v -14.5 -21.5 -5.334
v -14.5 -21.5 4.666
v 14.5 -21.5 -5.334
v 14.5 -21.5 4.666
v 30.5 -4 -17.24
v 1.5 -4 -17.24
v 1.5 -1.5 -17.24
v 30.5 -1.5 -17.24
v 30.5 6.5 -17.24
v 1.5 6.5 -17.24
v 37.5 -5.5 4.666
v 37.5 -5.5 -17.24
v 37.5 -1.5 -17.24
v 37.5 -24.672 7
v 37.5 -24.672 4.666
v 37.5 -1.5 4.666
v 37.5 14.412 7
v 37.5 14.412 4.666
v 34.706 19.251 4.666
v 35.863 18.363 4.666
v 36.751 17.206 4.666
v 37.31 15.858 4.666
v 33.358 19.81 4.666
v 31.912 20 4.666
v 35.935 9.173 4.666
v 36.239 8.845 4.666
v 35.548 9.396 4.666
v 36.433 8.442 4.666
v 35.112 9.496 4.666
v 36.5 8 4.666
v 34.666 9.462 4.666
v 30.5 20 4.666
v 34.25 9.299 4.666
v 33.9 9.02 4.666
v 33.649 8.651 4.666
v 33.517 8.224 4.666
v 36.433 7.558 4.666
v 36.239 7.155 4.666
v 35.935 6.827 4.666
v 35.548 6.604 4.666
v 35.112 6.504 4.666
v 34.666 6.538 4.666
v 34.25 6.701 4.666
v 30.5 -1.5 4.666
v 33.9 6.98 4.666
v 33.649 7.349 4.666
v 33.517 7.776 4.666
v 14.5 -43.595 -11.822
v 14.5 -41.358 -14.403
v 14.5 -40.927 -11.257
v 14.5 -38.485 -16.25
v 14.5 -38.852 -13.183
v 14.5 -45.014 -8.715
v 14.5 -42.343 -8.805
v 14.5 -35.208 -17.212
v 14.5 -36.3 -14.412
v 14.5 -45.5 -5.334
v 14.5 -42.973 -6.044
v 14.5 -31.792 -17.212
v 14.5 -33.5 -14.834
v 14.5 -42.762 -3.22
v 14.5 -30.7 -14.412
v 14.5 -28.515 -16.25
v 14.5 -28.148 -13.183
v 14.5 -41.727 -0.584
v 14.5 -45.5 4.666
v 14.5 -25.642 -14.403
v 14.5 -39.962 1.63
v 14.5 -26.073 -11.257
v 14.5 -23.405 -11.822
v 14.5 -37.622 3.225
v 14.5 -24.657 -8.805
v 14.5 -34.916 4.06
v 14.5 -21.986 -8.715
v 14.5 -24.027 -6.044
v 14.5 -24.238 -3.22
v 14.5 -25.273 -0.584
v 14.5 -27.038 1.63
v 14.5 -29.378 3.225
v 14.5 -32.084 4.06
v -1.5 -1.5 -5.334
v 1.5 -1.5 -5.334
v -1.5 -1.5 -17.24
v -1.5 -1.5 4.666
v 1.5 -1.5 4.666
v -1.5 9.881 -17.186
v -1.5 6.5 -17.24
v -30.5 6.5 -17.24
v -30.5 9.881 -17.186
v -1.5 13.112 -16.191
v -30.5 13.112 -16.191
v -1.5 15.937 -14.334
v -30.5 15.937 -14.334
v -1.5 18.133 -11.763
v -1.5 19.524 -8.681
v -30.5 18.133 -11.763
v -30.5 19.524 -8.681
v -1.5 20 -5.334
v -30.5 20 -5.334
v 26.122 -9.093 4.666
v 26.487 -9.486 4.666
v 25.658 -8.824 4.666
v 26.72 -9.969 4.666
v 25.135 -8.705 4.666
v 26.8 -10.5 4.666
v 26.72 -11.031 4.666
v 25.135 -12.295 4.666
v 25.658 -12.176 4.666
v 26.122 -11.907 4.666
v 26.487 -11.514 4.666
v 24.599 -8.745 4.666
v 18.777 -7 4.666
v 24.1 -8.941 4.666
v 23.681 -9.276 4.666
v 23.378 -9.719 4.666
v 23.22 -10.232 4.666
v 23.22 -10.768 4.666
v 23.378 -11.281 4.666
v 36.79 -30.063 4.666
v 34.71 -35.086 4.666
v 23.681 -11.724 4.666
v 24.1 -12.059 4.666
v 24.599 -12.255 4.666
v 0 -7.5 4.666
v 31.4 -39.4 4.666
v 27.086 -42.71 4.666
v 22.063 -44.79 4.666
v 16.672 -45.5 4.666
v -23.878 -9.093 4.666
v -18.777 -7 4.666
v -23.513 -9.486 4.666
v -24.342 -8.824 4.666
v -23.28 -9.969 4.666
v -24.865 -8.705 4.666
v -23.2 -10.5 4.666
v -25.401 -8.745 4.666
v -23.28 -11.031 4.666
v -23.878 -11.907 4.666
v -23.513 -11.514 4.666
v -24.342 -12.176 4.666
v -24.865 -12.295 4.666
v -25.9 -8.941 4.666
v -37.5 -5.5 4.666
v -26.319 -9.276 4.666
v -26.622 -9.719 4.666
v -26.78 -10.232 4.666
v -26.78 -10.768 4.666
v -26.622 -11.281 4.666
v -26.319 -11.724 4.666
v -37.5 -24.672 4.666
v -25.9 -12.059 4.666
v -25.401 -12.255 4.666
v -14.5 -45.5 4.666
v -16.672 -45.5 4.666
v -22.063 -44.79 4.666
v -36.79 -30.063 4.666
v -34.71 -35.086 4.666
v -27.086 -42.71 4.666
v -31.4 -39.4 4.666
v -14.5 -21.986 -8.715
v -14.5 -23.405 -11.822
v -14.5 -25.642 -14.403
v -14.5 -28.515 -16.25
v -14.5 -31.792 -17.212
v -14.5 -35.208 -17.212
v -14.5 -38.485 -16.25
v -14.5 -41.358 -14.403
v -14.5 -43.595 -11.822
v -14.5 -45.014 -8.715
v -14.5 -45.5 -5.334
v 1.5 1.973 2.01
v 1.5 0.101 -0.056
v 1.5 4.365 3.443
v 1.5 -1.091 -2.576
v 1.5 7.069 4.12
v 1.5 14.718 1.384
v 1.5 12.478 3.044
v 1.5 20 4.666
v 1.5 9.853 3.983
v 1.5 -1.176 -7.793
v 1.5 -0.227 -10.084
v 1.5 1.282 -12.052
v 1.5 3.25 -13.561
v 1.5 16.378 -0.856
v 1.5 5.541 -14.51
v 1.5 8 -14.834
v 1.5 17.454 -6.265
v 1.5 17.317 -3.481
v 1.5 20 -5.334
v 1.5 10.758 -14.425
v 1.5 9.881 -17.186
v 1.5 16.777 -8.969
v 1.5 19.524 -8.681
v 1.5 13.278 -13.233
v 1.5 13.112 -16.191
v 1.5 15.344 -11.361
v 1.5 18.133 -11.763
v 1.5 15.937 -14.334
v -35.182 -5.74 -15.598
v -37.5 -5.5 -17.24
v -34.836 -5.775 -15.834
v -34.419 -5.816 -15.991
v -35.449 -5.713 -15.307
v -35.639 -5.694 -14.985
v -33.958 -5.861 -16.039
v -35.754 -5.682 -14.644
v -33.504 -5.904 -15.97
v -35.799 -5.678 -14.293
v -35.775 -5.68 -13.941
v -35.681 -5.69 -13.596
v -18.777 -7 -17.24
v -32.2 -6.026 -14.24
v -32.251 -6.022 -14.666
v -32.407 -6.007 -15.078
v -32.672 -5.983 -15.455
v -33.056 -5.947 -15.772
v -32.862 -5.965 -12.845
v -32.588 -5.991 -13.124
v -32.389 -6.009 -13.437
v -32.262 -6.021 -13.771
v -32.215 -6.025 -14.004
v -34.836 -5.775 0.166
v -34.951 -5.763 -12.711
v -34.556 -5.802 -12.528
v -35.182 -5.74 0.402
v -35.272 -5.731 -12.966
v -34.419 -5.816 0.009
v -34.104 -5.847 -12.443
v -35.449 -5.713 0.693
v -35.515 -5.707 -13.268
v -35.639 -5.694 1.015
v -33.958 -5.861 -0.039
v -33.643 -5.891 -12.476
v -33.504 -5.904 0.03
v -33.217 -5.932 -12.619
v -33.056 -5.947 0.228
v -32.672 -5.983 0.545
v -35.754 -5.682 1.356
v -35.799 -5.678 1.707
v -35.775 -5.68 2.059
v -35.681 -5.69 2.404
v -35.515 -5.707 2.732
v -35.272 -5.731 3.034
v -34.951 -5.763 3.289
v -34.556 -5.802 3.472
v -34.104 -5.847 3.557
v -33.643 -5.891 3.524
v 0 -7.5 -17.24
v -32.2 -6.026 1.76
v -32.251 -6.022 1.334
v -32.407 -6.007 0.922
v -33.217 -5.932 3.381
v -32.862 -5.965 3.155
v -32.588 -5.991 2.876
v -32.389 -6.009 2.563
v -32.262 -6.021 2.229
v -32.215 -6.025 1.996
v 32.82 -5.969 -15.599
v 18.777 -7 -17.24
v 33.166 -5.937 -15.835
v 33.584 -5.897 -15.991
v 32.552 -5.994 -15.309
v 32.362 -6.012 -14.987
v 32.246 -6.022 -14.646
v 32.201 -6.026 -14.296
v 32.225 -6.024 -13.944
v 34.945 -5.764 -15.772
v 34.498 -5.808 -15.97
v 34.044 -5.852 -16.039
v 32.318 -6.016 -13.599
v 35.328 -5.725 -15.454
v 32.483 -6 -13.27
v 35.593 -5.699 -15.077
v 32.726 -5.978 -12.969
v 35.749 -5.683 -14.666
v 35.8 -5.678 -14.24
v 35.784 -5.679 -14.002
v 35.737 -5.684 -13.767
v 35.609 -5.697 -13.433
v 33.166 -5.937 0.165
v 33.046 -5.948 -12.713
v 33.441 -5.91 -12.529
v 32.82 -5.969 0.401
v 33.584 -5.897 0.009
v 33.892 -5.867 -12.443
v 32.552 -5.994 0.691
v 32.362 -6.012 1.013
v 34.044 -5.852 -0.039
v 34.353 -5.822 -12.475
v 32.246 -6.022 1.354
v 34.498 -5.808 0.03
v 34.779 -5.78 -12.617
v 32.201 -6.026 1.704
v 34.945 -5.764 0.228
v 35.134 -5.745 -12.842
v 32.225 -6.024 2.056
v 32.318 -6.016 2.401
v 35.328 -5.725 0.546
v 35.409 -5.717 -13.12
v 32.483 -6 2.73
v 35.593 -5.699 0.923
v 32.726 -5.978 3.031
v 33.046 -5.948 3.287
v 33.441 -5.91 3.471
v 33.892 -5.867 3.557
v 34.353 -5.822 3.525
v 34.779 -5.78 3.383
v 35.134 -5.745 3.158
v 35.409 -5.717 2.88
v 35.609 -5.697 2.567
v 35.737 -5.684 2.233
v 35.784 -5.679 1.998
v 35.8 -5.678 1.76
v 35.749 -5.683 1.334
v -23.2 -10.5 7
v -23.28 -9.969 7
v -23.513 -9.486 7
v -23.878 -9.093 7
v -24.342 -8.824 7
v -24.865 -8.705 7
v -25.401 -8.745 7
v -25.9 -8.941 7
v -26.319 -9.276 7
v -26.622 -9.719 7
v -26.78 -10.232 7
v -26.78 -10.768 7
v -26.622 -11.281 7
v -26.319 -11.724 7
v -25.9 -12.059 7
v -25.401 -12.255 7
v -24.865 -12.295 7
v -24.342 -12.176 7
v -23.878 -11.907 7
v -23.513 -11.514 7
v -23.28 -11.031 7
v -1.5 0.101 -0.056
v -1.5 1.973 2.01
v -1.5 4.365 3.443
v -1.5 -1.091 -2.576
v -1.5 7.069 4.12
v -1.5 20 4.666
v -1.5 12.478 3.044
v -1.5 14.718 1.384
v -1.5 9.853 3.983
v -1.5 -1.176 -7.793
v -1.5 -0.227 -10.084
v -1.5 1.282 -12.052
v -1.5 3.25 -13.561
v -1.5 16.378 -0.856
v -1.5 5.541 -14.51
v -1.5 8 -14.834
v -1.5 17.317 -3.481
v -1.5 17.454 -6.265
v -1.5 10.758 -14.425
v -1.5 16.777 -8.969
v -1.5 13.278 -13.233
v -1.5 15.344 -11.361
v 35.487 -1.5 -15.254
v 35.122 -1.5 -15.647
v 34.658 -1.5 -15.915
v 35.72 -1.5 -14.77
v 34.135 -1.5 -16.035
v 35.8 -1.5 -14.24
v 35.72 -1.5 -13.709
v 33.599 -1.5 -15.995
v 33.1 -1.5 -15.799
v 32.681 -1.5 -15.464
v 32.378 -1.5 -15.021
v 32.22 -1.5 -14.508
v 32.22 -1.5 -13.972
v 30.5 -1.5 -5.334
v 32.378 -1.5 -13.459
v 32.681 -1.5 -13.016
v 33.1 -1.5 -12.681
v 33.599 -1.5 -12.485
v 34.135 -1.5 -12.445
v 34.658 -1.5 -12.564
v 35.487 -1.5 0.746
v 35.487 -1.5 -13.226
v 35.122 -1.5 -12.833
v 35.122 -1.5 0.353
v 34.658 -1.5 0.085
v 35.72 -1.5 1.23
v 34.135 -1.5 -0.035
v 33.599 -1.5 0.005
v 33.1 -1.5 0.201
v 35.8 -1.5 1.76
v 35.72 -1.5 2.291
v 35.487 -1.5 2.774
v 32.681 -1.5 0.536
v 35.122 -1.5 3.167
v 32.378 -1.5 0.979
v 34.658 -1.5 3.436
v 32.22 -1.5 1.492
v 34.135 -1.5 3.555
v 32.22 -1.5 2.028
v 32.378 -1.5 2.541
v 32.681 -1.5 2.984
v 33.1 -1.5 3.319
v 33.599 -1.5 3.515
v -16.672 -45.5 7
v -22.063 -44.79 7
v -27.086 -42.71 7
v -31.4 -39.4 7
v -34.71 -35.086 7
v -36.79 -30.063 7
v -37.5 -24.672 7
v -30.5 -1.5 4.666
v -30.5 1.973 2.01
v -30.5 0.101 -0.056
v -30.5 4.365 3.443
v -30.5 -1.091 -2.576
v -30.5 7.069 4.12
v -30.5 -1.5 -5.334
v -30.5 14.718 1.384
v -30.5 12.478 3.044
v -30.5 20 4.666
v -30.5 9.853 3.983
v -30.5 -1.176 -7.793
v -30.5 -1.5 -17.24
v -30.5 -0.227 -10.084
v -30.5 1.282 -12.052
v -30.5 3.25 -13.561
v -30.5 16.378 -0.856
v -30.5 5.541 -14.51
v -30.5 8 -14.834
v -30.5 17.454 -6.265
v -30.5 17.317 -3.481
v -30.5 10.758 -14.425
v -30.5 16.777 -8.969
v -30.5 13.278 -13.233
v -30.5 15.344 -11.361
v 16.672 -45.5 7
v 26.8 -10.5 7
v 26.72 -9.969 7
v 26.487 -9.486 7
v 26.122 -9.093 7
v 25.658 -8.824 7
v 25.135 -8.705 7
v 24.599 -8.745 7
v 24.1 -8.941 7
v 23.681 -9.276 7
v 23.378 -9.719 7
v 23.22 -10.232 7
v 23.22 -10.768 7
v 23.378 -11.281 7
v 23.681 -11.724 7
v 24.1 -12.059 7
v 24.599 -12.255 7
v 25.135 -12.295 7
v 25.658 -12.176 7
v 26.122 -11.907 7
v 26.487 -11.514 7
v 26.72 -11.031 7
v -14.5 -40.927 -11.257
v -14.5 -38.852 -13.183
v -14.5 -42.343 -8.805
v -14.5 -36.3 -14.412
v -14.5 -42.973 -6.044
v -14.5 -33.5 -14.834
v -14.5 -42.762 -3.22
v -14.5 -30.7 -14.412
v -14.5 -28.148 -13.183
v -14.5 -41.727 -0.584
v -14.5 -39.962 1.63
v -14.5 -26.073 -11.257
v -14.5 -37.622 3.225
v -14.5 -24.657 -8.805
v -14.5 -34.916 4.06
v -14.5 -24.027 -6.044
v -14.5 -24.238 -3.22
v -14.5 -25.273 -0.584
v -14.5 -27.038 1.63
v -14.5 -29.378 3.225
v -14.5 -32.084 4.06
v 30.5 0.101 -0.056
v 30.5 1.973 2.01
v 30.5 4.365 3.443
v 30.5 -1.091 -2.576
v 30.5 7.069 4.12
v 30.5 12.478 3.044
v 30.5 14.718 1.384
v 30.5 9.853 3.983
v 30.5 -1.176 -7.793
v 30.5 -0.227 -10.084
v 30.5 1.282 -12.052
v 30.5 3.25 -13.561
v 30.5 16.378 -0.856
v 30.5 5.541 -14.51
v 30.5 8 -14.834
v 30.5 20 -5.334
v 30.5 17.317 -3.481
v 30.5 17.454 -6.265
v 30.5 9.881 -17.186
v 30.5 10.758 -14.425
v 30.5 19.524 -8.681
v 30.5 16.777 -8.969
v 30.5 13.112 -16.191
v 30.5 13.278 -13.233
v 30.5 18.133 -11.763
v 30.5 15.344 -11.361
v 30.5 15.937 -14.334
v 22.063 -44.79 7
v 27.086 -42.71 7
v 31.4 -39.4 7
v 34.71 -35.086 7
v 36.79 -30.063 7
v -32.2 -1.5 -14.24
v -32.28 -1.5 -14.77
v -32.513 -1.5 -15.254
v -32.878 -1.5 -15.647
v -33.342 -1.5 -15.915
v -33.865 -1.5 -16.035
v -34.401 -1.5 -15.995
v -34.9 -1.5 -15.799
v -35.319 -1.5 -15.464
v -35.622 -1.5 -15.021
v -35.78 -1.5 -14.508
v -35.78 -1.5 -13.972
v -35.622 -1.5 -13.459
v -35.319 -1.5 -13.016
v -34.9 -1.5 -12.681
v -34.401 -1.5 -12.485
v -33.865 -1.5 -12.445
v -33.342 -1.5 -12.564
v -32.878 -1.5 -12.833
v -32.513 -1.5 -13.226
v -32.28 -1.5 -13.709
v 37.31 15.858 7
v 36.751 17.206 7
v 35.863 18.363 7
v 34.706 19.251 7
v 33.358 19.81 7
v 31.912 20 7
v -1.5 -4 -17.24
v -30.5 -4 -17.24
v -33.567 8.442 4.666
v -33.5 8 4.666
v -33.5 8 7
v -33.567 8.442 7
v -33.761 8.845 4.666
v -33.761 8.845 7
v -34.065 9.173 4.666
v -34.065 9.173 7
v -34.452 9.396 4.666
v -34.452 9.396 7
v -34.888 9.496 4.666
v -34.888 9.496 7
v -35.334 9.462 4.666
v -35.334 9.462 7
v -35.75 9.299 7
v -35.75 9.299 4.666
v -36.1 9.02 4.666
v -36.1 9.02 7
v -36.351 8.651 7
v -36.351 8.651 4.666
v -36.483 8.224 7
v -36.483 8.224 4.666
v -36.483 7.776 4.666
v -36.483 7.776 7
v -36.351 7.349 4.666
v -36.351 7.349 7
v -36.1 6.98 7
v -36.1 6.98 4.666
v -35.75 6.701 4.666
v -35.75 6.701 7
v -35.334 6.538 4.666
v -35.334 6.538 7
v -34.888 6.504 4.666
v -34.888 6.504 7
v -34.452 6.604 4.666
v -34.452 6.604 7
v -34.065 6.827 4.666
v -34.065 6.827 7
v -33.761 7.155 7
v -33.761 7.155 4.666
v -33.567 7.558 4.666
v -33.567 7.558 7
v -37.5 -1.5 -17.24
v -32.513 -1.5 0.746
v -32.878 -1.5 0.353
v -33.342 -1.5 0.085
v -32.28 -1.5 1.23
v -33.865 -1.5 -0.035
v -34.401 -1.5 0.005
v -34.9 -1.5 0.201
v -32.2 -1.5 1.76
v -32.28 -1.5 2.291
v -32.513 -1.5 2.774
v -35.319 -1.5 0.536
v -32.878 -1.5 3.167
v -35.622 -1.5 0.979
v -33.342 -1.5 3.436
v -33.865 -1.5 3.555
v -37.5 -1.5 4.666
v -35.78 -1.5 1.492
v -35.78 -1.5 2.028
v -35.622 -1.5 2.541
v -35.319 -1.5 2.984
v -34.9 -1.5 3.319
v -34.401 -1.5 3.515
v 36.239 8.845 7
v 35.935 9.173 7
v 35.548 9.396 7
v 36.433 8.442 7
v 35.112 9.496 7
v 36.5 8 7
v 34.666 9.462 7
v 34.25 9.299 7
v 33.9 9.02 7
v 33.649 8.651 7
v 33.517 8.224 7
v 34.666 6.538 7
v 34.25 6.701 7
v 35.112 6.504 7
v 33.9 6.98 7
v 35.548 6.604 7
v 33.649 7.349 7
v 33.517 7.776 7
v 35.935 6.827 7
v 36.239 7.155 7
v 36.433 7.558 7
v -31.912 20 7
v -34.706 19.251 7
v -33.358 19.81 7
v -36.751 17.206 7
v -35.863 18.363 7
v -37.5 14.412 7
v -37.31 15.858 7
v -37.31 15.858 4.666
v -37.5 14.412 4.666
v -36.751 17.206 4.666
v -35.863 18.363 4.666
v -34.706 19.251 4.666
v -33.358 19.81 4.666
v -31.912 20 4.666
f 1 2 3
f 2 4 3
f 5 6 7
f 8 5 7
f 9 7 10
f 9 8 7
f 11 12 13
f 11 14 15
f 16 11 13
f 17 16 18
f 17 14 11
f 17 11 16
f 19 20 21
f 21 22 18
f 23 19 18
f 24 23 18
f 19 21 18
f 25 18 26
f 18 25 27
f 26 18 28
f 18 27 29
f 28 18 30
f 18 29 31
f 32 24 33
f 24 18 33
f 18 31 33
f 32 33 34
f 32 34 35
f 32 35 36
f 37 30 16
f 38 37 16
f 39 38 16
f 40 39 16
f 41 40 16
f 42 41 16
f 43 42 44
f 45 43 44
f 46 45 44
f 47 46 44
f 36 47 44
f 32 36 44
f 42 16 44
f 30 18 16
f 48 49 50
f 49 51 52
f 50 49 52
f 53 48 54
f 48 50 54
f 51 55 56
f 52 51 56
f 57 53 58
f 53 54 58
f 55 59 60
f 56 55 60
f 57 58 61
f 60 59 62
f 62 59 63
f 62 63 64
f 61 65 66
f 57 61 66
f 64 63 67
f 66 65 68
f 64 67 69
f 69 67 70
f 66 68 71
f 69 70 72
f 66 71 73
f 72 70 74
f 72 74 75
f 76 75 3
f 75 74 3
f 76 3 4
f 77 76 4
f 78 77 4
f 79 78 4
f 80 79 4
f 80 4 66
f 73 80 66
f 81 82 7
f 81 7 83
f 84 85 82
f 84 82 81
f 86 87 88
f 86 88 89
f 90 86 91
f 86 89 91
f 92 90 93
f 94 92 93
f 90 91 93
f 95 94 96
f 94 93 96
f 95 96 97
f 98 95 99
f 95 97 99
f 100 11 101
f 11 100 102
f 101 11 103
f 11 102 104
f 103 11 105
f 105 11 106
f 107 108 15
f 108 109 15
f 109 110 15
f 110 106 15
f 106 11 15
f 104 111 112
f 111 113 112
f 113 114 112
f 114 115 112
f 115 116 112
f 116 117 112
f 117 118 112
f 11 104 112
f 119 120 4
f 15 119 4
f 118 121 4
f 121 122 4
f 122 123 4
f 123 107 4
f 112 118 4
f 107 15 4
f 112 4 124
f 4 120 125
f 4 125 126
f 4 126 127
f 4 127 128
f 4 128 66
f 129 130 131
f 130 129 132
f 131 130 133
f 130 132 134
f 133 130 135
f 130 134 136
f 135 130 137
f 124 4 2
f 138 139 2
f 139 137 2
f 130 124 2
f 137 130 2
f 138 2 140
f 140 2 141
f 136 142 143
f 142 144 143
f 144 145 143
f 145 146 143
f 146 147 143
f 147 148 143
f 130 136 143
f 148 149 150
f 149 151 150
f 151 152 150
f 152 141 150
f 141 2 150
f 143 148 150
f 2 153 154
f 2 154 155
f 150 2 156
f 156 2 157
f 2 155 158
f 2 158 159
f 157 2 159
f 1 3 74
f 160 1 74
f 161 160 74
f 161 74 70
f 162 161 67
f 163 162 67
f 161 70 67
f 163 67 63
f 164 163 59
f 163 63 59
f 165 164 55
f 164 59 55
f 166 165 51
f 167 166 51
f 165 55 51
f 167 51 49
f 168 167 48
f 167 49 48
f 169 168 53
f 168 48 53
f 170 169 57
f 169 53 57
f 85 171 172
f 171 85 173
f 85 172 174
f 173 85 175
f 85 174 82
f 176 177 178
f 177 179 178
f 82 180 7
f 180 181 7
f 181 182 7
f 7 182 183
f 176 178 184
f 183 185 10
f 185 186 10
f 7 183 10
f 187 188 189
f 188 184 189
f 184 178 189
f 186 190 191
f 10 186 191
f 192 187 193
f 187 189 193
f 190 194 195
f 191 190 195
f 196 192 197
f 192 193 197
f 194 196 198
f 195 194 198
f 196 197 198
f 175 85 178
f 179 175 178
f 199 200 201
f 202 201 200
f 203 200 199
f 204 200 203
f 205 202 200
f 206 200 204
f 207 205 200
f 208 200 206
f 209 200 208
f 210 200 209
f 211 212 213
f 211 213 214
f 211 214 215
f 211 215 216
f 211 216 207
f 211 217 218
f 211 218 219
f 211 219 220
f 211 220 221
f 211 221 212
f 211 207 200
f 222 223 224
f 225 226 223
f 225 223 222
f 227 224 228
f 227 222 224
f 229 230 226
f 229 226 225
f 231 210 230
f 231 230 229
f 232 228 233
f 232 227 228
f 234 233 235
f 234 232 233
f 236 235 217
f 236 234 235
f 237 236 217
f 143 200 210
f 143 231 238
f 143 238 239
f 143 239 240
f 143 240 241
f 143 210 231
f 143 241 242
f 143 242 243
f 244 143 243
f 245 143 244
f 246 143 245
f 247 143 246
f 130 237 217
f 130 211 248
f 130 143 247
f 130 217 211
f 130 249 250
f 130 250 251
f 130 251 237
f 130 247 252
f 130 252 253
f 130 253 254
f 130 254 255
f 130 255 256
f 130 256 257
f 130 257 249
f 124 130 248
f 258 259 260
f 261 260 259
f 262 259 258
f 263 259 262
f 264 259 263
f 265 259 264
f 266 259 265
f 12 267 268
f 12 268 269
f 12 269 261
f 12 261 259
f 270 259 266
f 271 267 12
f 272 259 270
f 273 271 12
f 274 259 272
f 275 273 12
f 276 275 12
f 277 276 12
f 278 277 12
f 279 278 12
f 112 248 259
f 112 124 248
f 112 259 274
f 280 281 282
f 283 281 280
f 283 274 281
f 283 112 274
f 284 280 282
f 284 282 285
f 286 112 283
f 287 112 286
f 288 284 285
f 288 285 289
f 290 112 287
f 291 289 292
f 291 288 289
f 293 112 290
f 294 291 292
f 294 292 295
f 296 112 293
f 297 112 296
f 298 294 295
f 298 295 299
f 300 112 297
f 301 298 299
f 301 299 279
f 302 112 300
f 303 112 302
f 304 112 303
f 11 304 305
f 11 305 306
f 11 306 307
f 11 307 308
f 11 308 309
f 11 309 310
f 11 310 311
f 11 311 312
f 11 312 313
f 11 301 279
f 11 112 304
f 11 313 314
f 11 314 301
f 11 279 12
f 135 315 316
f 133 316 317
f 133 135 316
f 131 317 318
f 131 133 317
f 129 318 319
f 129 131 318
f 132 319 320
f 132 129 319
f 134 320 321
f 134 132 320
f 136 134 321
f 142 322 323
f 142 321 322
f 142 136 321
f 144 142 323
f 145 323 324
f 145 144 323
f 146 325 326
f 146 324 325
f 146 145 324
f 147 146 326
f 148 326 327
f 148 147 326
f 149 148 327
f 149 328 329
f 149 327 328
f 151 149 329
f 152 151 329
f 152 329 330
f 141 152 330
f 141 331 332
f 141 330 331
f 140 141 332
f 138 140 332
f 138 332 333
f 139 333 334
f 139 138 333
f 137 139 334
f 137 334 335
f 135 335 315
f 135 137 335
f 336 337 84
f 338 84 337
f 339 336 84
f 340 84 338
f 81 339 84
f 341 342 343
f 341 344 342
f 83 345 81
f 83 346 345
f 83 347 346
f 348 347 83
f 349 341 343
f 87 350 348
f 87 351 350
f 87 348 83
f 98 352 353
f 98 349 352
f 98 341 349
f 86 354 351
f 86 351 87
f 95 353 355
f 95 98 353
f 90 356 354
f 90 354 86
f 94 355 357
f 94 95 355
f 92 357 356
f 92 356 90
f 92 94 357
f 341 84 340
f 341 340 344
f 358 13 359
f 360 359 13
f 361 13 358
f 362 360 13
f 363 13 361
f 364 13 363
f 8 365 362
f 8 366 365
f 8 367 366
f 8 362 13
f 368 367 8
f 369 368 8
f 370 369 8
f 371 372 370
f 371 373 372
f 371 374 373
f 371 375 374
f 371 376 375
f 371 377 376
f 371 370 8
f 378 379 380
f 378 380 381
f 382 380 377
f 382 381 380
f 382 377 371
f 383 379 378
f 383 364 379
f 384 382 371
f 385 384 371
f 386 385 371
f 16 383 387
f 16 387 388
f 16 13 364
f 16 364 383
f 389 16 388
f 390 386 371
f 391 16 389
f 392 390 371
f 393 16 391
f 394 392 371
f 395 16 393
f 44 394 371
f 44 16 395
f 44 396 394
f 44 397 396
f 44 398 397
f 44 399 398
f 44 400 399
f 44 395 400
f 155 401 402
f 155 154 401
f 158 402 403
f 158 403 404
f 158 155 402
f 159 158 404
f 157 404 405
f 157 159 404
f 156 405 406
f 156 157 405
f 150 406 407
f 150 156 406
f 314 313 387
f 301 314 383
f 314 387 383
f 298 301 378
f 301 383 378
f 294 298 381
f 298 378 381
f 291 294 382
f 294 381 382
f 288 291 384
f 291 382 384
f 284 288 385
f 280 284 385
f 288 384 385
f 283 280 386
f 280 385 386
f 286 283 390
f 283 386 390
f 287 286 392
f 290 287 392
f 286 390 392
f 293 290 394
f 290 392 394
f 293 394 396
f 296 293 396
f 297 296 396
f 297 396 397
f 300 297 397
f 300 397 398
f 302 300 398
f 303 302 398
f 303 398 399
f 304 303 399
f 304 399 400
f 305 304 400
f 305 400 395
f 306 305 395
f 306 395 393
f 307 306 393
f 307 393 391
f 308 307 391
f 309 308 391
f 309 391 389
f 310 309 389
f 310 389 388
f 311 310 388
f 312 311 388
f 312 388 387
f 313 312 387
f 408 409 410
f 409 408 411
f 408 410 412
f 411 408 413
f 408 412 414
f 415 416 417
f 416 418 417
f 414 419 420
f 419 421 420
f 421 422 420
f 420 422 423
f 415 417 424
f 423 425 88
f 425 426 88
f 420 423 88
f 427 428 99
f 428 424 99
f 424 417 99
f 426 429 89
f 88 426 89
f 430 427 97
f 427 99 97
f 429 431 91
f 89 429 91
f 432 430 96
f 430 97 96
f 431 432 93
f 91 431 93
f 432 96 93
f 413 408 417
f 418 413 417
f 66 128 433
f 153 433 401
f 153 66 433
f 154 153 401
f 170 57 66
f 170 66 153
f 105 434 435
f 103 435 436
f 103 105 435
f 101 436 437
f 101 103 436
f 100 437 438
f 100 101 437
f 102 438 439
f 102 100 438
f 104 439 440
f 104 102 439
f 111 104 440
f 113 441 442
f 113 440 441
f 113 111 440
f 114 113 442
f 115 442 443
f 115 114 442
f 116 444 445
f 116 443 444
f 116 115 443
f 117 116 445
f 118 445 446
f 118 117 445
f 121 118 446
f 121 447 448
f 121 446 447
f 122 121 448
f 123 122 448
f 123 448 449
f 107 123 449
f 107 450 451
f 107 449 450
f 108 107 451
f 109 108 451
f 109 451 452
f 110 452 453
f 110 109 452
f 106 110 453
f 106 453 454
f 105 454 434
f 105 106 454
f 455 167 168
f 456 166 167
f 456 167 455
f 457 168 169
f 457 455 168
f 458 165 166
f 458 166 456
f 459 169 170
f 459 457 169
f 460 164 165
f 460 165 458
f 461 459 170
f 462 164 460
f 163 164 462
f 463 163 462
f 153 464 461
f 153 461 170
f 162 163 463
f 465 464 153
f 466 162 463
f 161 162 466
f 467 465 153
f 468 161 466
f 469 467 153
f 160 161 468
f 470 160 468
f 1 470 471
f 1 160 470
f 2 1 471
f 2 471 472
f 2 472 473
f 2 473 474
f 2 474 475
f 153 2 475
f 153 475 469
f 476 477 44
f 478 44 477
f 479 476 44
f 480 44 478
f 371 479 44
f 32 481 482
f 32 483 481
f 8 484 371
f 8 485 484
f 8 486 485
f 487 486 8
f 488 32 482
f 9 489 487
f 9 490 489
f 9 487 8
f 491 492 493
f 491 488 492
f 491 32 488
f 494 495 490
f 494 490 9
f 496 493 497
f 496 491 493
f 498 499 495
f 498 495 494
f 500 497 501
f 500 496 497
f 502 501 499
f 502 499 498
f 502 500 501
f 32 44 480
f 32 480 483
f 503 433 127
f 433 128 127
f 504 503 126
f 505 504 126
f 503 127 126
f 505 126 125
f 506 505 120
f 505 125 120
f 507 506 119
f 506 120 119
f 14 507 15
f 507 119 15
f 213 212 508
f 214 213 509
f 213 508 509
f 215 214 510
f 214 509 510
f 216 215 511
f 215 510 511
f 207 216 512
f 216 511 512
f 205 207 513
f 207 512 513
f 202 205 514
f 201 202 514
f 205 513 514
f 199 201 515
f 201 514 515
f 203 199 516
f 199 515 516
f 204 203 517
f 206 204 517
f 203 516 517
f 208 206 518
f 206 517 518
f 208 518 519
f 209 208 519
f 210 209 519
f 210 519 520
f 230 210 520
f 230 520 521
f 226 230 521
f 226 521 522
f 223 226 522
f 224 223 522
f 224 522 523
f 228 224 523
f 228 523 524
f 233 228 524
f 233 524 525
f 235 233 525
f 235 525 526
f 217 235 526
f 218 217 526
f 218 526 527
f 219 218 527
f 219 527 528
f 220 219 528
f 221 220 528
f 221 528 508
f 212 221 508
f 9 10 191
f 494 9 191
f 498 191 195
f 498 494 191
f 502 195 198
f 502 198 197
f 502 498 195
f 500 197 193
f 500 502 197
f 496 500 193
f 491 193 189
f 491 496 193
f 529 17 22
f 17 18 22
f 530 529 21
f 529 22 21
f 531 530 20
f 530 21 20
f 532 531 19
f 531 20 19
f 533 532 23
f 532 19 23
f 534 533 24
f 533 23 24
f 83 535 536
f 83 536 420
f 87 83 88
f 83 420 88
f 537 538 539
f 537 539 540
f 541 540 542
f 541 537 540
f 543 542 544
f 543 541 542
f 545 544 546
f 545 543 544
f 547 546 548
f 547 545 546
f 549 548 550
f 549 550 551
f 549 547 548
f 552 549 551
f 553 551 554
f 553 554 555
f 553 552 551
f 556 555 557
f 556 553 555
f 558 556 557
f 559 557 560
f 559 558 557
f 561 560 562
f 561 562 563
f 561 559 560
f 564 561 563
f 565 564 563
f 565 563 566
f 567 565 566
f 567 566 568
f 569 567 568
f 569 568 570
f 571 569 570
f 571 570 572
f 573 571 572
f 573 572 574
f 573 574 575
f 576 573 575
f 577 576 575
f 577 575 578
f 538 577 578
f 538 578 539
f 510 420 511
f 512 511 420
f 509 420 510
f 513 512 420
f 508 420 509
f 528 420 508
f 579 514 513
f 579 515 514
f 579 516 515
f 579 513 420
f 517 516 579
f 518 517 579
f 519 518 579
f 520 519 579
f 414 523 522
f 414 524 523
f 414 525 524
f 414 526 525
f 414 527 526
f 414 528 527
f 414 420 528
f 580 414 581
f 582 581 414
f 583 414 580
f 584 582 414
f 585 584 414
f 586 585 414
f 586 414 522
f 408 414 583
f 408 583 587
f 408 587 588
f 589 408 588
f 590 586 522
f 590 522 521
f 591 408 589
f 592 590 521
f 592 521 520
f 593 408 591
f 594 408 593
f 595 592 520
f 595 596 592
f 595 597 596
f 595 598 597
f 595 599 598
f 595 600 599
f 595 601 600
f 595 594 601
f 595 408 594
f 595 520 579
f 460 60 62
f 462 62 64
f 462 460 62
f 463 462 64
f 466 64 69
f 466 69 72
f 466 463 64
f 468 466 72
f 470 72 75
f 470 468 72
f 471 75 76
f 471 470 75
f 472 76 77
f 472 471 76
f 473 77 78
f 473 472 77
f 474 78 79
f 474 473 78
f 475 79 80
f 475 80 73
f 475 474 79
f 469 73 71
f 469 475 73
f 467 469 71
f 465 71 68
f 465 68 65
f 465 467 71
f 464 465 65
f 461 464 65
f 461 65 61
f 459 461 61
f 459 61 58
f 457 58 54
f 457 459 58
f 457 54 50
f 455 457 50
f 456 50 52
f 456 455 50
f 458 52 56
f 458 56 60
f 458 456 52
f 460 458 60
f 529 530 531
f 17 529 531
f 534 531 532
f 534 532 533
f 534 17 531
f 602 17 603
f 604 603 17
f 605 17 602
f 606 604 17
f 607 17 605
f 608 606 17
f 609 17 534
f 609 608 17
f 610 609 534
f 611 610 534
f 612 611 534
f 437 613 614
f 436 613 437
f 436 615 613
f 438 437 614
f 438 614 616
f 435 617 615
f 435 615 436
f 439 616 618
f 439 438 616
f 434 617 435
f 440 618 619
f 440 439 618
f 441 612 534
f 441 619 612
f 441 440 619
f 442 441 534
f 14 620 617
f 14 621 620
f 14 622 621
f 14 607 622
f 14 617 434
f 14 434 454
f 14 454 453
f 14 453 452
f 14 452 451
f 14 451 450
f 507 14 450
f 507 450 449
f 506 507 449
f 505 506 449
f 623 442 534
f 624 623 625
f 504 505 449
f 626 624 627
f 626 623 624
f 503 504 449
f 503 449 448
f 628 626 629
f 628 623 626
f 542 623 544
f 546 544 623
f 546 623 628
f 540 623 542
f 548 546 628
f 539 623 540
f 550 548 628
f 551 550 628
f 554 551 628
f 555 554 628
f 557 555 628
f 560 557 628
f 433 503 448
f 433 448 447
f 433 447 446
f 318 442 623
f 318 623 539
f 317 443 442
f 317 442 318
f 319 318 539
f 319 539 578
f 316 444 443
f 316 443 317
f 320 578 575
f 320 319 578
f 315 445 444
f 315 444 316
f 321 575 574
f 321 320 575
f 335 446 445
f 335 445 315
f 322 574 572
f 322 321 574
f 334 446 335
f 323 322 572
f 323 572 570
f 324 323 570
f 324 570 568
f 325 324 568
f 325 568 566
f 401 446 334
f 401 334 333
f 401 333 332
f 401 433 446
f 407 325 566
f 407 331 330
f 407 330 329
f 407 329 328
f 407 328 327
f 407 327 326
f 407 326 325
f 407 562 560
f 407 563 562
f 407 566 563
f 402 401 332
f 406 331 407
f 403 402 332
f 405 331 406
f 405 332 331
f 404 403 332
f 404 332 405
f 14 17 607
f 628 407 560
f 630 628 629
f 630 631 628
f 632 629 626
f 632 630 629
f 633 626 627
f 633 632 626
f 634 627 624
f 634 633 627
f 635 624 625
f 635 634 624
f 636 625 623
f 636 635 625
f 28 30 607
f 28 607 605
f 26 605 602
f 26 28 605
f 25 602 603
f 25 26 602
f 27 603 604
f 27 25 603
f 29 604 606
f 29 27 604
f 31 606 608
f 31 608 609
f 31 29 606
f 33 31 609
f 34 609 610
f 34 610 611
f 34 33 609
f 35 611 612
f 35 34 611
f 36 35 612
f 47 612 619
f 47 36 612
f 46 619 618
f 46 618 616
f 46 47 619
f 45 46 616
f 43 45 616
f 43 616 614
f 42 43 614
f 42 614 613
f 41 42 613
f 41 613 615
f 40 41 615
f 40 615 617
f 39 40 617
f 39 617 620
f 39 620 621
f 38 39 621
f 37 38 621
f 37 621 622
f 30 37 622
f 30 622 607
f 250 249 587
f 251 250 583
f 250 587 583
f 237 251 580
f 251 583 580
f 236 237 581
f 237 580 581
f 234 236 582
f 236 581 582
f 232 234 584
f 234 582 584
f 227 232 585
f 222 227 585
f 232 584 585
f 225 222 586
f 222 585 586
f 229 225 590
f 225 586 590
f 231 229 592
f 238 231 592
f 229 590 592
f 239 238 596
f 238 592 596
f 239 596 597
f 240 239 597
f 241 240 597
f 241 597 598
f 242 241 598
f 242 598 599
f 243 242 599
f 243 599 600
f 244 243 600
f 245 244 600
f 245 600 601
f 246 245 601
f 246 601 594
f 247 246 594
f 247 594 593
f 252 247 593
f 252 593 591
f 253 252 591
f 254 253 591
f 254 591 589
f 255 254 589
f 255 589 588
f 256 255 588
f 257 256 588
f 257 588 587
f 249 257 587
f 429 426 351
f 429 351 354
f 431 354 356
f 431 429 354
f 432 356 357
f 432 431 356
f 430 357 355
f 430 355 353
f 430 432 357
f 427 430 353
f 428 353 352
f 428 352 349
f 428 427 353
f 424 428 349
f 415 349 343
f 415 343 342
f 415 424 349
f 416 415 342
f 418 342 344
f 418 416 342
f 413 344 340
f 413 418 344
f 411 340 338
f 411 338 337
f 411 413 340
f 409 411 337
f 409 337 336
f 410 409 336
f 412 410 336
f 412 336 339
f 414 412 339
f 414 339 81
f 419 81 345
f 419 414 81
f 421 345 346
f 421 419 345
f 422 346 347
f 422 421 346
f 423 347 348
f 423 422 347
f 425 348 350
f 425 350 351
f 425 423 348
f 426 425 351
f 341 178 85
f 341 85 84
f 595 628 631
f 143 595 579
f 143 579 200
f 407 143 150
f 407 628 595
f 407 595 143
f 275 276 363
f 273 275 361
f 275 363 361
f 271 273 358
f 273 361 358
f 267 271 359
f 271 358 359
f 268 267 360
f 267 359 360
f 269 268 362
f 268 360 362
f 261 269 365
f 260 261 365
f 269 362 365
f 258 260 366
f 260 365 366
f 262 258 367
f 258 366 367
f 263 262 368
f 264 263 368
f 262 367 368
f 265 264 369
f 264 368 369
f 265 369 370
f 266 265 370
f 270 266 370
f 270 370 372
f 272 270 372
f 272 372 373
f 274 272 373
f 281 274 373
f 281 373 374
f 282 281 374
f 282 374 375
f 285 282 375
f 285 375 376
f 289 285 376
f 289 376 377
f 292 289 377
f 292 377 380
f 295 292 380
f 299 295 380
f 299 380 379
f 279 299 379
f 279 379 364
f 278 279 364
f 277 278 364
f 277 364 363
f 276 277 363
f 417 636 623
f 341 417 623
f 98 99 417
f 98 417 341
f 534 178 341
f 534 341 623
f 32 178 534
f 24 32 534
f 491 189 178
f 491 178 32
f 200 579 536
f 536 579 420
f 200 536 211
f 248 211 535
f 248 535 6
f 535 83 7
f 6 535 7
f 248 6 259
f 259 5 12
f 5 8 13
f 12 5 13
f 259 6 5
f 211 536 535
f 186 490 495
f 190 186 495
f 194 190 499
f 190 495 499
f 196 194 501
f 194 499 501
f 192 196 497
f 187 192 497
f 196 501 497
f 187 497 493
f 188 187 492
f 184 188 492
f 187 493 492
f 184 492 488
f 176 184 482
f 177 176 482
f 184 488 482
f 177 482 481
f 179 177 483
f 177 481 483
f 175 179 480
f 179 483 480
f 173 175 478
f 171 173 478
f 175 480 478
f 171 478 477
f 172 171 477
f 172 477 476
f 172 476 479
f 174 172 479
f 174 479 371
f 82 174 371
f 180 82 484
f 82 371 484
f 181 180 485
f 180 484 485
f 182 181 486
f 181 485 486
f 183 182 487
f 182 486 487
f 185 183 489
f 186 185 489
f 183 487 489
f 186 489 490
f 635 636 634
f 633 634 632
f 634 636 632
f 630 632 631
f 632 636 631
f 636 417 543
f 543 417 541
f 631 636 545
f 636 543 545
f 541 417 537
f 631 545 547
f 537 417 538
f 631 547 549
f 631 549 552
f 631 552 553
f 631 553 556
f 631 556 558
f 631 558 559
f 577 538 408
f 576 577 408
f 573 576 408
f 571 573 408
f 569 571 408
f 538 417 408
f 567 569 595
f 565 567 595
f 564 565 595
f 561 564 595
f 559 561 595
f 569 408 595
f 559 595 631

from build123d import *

# Parameters (mm, degrees)
SKETCH1_R            = 1.79994
SKETCH1_R_2          = 1.5
BOSS_EXTRUDE1_DEPTH  = 7
SKETCH2_W            = 75
SKETCH2_H            = 13.099999962
SKETCH2_R            = 2.6999438
SKETCH2_R_2          = 2.499995
SKETCH2_R_3          = 1.3498449
BOSS_EXTRUDE2_DEPTH  = 6.987999994
SKETCH2_3_R          = 2.6999438
SKETCH2_3_R_2        = 1.3498449
CUT_EXTRUDE1_DEPTH   = 2.5
SKETCH5_W            = 75
SKETCH5_H            = 13.099999962
CUT_EXTRUDE3_DEPTH   = 21.082
SKETCH6_W            = 75
SKETCH6_H            = 7
BOSS_EXTRUDE3_DEPTH  = 9.5
SKETCH8_W            = 75
SKETCH8_H            = 38.030205227
CUT_EXTRUDE4_DEPTH   = 4.666
SKETCH10_W           = 75
SKETCH10_H           = 2.334
BOSS_EXTRUDE5_DEPTH  = 35
SKETCH11_R           = 1.79994
CUT_EXTRUDE5_DEPTH   = 5
SKETCH15_W           = 44.653530321
SKETCH15_H           = 13.617301916
SKETCH15_W_2         = 11.728266088
SKETCH15_H_2         = 5.987537529
BOSS_EXTRUDE7_DEPTH  = 2.334
SKETCH16_R           = 9.5
BOSS_EXTRUDE9_DEPTH  = 29
SKETCH17_R           = 9.5
BOSS_EXTRUDE11_DEPTH = 14.5
FILLET5_R            = 20.828
FILLET6_R            = 5.588
BOSS_EXTRUDE13_DEPTH = 21.905881
CUT_EXTRUDE6_REACH   = 46
SKETCH21_R           = 1.8


with BuildPart() as part:
    # Sketch1 → Boss-Extrude1 (new body)
    with BuildSketch(Plane.XY):
        with BuildLine():
            Line((37.5, -10.5), (30, -10.5))
            ThreePointArc((30, -10.5), (25, -15.5), (20, -10.5))
            Line((20, -10.5), (5, -10.5))
            ThreePointArc((5, -10.5), (0, -15.5), (-5, -10.5))
            Line((-5, -10.5), (-20, -10.5))
            ThreePointArc((-20, -10.5), (-25, -15.5), (-30, -10.5))
            Line((-30, -10.5), (-37.5, -10.5))
            Line((-37.5, -10.5), (-37.5, 10.5))
            Line((-37.5, 10.5), (37.5, 10.5))
            Line((37.5, 10.5), (37.5, -10.5))
        make_face()
        with Locations((-25, -10.5)):
            Circle(SKETCH1_R, mode=Mode.SUBTRACT)
        with Locations((0, -10.5)):
            Circle(SKETCH1_R, mode=Mode.SUBTRACT)
        with Locations((25, -10.5)):
            Circle(SKETCH1_R, mode=Mode.SUBTRACT)
        with Locations((-35, 8)):
            Circle(SKETCH1_R_2, mode=Mode.SUBTRACT)
        with Locations((-15, 8)):
            Circle(SKETCH1_R_2, mode=Mode.SUBTRACT)
        with Locations((-10, 8)):
            Circle(SKETCH1_R_2, mode=Mode.SUBTRACT)
        with Locations((10, 8)):
            Circle(SKETCH1_R_2, mode=Mode.SUBTRACT)
        with Locations((35, 8)):
            Circle(SKETCH1_R_2, mode=Mode.SUBTRACT)
        with Locations((15, 8)):
            Circle(SKETCH1_R_2, mode=Mode.SUBTRACT)
    extrude(amount=BOSS_EXTRUDE1_DEPTH)

    # Sketch2 → Boss-Extrude2 (add)
    with BuildSketch(Plane(origin=(0, 2.24999999, 0), x_dir=(1, 0, 0), z_dir=(0, 1, 0))):
        with Locations((0, -13.549999981)):
            Rectangle(SKETCH2_W, SKETCH2_H)
        with Locations((31.0001404, -13.549999981)):
            Circle(SKETCH2_R, mode=Mode.SUBTRACT)
        with Locations((-31.0001404, -13.549999981)):
            Circle(SKETCH2_R, mode=Mode.SUBTRACT)
        with Locations((-25, -13.549999981)):
            Circle(SKETCH2_R_2, mode=Mode.SUBTRACT)
        with Locations((-6.0001404, -13.549999981)):
            Circle(SKETCH2_R, mode=Mode.SUBTRACT)
        with Locations((6.0001404, -13.549999981)):
            Circle(SKETCH2_R, mode=Mode.SUBTRACT)
        with Locations((0, -13.549999981)):
            Circle(SKETCH2_R_2, mode=Mode.SUBTRACT)
        with Locations((-18.9998596, -13.549999981)):
            Circle(SKETCH2_R, mode=Mode.SUBTRACT)
        with Locations((25, -13.549999981)):
            Circle(SKETCH2_R_2, mode=Mode.SUBTRACT)
        with Locations((18.9998596, -13.549999981)):
            Circle(SKETCH2_R, mode=Mode.SUBTRACT)
        with Locations((-31.0001404, -13.549999981)):
            Circle(SKETCH2_R)
        with Locations((-31.0001404, -13.549999981)):
            Circle(SKETCH2_R_3, mode=Mode.SUBTRACT)
        with Locations((-18.9998596, -13.549999981)):
            Circle(SKETCH2_R)
        with Locations((-18.9998596, -13.549999981)):
            Circle(SKETCH2_R_3, mode=Mode.SUBTRACT)
        with Locations((-6.0001404, -13.549999981)):
            Circle(SKETCH2_R)
        with Locations((-6.0001404, -13.549999981)):
            Circle(SKETCH2_R_3, mode=Mode.SUBTRACT)
        with Locations((6.0001404, -13.549999981)):
            Circle(SKETCH2_R)
        with Locations((6.0001404, -13.549999981)):
            Circle(SKETCH2_R_3, mode=Mode.SUBTRACT)
        with Locations((18.9998596, -13.549999981)):
            Circle(SKETCH2_R)
        with Locations((18.9998596, -13.549999981)):
            Circle(SKETCH2_R_3, mode=Mode.SUBTRACT)
        with Locations((31.0001404, -13.549999981)):
            Circle(SKETCH2_R)
        with Locations((31.0001404, -13.549999981)):
            Circle(SKETCH2_R_3, mode=Mode.SUBTRACT)
    extrude(amount=-BOSS_EXTRUDE2_DEPTH)

    # Sketch2<3> → Cut-Extrude1 (cut)
    with BuildSketch(Plane(origin=(0, 2.24999999, 0), x_dir=(1, 0, 0), z_dir=(0, 1, 0))):
        with Locations((-31.0001404, -13.549999981)):
            Circle(SKETCH2_3_R)
        with Locations((-31.0001404, -13.549999981)):
            Circle(SKETCH2_3_R_2, mode=Mode.SUBTRACT)
        with Locations((-18.9998596, -13.549999981)):
            Circle(SKETCH2_3_R)
        with Locations((-18.9998596, -13.549999981)):
            Circle(SKETCH2_3_R_2, mode=Mode.SUBTRACT)
        with Locations((-6.0001404, -13.549999981)):
            Circle(SKETCH2_3_R)
        with Locations((-6.0001404, -13.549999981)):
            Circle(SKETCH2_3_R_2, mode=Mode.SUBTRACT)
        with Locations((6.0001404, -13.549999981)):
            Circle(SKETCH2_3_R)
        with Locations((6.0001404, -13.549999981)):
            Circle(SKETCH2_3_R_2, mode=Mode.SUBTRACT)
        with Locations((18.9998596, -13.549999981)):
            Circle(SKETCH2_3_R)
        with Locations((18.9998596, -13.549999981)):
            Circle(SKETCH2_3_R_2, mode=Mode.SUBTRACT)
        with Locations((31.0001404, -13.549999981)):
            Circle(SKETCH2_3_R)
        with Locations((31.0001404, -13.549999981)):
            Circle(SKETCH2_3_R_2, mode=Mode.SUBTRACT)
    extrude(amount=-CUT_EXTRUDE1_DEPTH, mode=Mode.SUBTRACT)

    # Sketch5 → Cut-Extrude3 (cut)
    with BuildSketch(Plane(origin=(0, 2.24999999, 0), x_dir=(1, 0, 0), z_dir=(0, 1, 0))):
        with Locations((0, -13.549999981)):
            Rectangle(SKETCH5_W, SKETCH5_H)
    extrude(amount=-CUT_EXTRUDE3_DEPTH, mode=Mode.SUBTRACT)

    # Sketch6 → Boss-Extrude3 (add)
    with BuildSketch(Plane(origin=(0, 10.5, 0), x_dir=(1, 0, 0), z_dir=(0, 1, 0))):
        with Locations((0, -3.5)):
            Rectangle(SKETCH6_W, SKETCH6_H)
    extrude(amount=BOSS_EXTRUDE3_DEPTH)

    # Sketch8 → Cut-Extrude4 (cut)
    with BuildSketch(Plane(origin=(0, 0, 0), x_dir=(-1, 0, 0), z_dir=(0, 0, -1))):
        with Locations((0, 0.984897387)):
            Rectangle(SKETCH8_W, SKETCH8_H)
    extrude(amount=-CUT_EXTRUDE4_DEPTH, mode=Mode.SUBTRACT)

    # Sketch10 → Boss-Extrude5 (add)
    with BuildSketch(Plane(origin=(0, -45.5, 0), x_dir=(-1, 0, 0), z_dir=(0, -1, 0))):
        with Locations((0, -5.833)):
            Rectangle(SKETCH10_W, SKETCH10_H)
    extrude(amount=-BOSS_EXTRUDE5_DEPTH)

    # Sketch11 → Cut-Extrude5 (cut)
    with BuildSketch(Plane(origin=(0, 0, 4.666), x_dir=(-1, 0, 0), z_dir=(0, 0, -1))):
        with Locations((-25, -10.5)):
            Circle(SKETCH11_R)
        with Locations((0, -10.5)):
            Circle(SKETCH11_R)
        with Locations((25, -10.5)):
            Circle(SKETCH11_R)
    extrude(amount=-CUT_EXTRUDE5_DEPTH, mode=Mode.SUBTRACT)

    # Sketch15 → Boss-Extrude7 (add)
    with BuildSketch(Plane.XY.offset(7)):
        with Locations((1.804442165, 8.803924913)):
            Rectangle(SKETCH15_W, SKETCH15_H)
        with Locations((-1.501191344, -11.287680254)):
            Rectangle(SKETCH15_W_2, SKETCH15_H_2)
    extrude(amount=-BOSS_EXTRUDE7_DEPTH)


with BuildPart() as body_2:
    # Sketch16 → Boss-Extrude9 (new body)
    with BuildSketch(Plane(origin=(30.50000003, 0, 0), x_dir=(0, 0, -1), z_dir=(1, 0, 0))):
        with BuildLine():
            Line((-4.666, -4), (5.334, -4))
            Line((5.334, -4), (17.2398809, -4))
            Line((17.2398809, -4), (17.2398809, 6.5))
            ThreePointArc((17.2398809, 6.5), (14.334, 15.937253933), (5.334, 20))
            Line((5.334, 20), (-4.666, 20))
            Line((-4.666, 20), (-4.666, -4))
        make_face()
        with Locations((5.334, 8)):
            Circle(SKETCH16_R, mode=Mode.SUBTRACT)
    extrude(amount=-BOSS_EXTRUDE9_DEPTH)


with BuildPart() as body_3:
    # Mirror1: mirrored copy
    add(body_2.part.mirror(Plane(origin=(0, 0, 0), x_dir=(0, 0, 1), z_dir=(1, 0, 0))))

    # Combine1: union body 2, part
    add(body_2.part)
    add(part.part)

    # Sketch17 → Boss-Extrude11 (add, symmetric)
    with BuildSketch(Plane(origin=(0, 0, 0), x_dir=(0, 0, -1), z_dir=(1, 0, 0))):
        with BuildLine():
            Line((5.334, -45.5), (-4.666, -45.5))
            Line((-4.666, -45.5), (-4.666, -21.5))
            Line((-4.666, -21.5), (5.334, -21.5))
            ThreePointArc((5.334, -21.5), (17.334, -33.5), (5.334, -45.5))
        make_face()
        with Locations((5.334, -33.5)):
            Circle(SKETCH17_R, mode=Mode.SUBTRACT)
    extrude(amount=BOSS_EXTRUDE11_DEPTH, both=True)

    # Fillet5
    fillet5_edges = [body_3.edges().sort_by_distance(p)[0] for p in [
        (37.5, -45.5, 5.833),
        (-37.5, -45.5, 5.833),
    ]]
    fillet(fillet5_edges, radius=FILLET5_R)

    # Fillet6
    fillet6_edges = [body_3.edges().sort_by_distance(p)[0] for p in [
        (-37.5, 20, 5.833),
        (37.5, 20, 5.833),
    ]]
    fillet(fillet6_edges, radius=FILLET6_R)

    # Sketch20 → Boss-Extrude13 (add)
    with BuildSketch(Plane(origin=(0, 0, 4.666), x_dir=(-1, 0, 0), z_dir=(0, 0, -1))):
        with BuildLine():
            Line((-37.5, -1.5), (37.5, -1.5))
            Line((37.5, -1.5), (37.5, -5.5))
            ThreePointArc((37.5, -5.5), (0, -7.5), (-37.5, -5.5))
            Line((-37.5, -5.5), (-37.5, -1.5))
        make_face()
    extrude(amount=BOSS_EXTRUDE13_DEPTH)

    # Sketch21 → Cut-Extrude6 (cut, up to next)
    with BuildSketch(Plane(origin=(0, -1.5, 0), x_dir=(1, 0, 0), z_dir=(0, 1, 0)), mode=Mode.PRIVATE) as cut_extrude6_sk1:
        with Locations((34, 14.2398809)):
            Circle(SKETCH21_R)
    cut_extrude6_tool1 = extrude(cut_extrude6_sk1.sketch, amount=-CUT_EXTRUDE6_REACH, mode=Mode.PRIVATE) & body_3.part
    add(cut_extrude6_tool1.solids().sort_by_distance((34, -1.5, -14.239881))[0], mode=Mode.SUBTRACT)
    # Sketch21 → Cut-Extrude6 (cut, up to next)
    with BuildSketch(Plane(origin=(0, -1.5, 0), x_dir=(1, 0, 0), z_dir=(0, 1, 0)), mode=Mode.PRIVATE) as cut_extrude6_sk2:
        with Locations((34, -1.7601191)):
            Circle(SKETCH21_R)
    cut_extrude6_tool2 = extrude(cut_extrude6_sk2.sketch, amount=-CUT_EXTRUDE6_REACH, mode=Mode.PRIVATE) & body_3.part
    add(cut_extrude6_tool2.solids().sort_by_distance((34, -1.5, 1.760119))[0], mode=Mode.SUBTRACT)
    # Sketch21 → Cut-Extrude6 (cut, up to next)
    with BuildSketch(Plane(origin=(0, -1.5, 0), x_dir=(1, 0, 0), z_dir=(0, 1, 0)), mode=Mode.PRIVATE) as cut_extrude6_sk3:
        with Locations((-34, -1.7601191)):
            Circle(SKETCH21_R)
    cut_extrude6_tool3 = extrude(cut_extrude6_sk3.sketch, amount=-CUT_EXTRUDE6_REACH, mode=Mode.PRIVATE) & body_3.part
    add(cut_extrude6_tool3.solids().sort_by_distance((-34, -1.5, 1.760119))[0], mode=Mode.SUBTRACT)
    # Sketch21 → Cut-Extrude6 (cut, up to next)
    with BuildSketch(Plane(origin=(0, -1.5, 0), x_dir=(1, 0, 0), z_dir=(0, 1, 0)), mode=Mode.PRIVATE) as cut_extrude6_sk4:
        with Locations((-34, 14.2398809)):
            Circle(SKETCH21_R)
    cut_extrude6_tool4 = extrude(cut_extrude6_sk4.sketch, amount=-CUT_EXTRUDE6_REACH, mode=Mode.PRIVATE) & body_3.part
    add(cut_extrude6_tool4.solids().sort_by_distance((-34, -1.5, -14.239881))[0], mode=Mode.SUBTRACT)


solid = body_3.part
